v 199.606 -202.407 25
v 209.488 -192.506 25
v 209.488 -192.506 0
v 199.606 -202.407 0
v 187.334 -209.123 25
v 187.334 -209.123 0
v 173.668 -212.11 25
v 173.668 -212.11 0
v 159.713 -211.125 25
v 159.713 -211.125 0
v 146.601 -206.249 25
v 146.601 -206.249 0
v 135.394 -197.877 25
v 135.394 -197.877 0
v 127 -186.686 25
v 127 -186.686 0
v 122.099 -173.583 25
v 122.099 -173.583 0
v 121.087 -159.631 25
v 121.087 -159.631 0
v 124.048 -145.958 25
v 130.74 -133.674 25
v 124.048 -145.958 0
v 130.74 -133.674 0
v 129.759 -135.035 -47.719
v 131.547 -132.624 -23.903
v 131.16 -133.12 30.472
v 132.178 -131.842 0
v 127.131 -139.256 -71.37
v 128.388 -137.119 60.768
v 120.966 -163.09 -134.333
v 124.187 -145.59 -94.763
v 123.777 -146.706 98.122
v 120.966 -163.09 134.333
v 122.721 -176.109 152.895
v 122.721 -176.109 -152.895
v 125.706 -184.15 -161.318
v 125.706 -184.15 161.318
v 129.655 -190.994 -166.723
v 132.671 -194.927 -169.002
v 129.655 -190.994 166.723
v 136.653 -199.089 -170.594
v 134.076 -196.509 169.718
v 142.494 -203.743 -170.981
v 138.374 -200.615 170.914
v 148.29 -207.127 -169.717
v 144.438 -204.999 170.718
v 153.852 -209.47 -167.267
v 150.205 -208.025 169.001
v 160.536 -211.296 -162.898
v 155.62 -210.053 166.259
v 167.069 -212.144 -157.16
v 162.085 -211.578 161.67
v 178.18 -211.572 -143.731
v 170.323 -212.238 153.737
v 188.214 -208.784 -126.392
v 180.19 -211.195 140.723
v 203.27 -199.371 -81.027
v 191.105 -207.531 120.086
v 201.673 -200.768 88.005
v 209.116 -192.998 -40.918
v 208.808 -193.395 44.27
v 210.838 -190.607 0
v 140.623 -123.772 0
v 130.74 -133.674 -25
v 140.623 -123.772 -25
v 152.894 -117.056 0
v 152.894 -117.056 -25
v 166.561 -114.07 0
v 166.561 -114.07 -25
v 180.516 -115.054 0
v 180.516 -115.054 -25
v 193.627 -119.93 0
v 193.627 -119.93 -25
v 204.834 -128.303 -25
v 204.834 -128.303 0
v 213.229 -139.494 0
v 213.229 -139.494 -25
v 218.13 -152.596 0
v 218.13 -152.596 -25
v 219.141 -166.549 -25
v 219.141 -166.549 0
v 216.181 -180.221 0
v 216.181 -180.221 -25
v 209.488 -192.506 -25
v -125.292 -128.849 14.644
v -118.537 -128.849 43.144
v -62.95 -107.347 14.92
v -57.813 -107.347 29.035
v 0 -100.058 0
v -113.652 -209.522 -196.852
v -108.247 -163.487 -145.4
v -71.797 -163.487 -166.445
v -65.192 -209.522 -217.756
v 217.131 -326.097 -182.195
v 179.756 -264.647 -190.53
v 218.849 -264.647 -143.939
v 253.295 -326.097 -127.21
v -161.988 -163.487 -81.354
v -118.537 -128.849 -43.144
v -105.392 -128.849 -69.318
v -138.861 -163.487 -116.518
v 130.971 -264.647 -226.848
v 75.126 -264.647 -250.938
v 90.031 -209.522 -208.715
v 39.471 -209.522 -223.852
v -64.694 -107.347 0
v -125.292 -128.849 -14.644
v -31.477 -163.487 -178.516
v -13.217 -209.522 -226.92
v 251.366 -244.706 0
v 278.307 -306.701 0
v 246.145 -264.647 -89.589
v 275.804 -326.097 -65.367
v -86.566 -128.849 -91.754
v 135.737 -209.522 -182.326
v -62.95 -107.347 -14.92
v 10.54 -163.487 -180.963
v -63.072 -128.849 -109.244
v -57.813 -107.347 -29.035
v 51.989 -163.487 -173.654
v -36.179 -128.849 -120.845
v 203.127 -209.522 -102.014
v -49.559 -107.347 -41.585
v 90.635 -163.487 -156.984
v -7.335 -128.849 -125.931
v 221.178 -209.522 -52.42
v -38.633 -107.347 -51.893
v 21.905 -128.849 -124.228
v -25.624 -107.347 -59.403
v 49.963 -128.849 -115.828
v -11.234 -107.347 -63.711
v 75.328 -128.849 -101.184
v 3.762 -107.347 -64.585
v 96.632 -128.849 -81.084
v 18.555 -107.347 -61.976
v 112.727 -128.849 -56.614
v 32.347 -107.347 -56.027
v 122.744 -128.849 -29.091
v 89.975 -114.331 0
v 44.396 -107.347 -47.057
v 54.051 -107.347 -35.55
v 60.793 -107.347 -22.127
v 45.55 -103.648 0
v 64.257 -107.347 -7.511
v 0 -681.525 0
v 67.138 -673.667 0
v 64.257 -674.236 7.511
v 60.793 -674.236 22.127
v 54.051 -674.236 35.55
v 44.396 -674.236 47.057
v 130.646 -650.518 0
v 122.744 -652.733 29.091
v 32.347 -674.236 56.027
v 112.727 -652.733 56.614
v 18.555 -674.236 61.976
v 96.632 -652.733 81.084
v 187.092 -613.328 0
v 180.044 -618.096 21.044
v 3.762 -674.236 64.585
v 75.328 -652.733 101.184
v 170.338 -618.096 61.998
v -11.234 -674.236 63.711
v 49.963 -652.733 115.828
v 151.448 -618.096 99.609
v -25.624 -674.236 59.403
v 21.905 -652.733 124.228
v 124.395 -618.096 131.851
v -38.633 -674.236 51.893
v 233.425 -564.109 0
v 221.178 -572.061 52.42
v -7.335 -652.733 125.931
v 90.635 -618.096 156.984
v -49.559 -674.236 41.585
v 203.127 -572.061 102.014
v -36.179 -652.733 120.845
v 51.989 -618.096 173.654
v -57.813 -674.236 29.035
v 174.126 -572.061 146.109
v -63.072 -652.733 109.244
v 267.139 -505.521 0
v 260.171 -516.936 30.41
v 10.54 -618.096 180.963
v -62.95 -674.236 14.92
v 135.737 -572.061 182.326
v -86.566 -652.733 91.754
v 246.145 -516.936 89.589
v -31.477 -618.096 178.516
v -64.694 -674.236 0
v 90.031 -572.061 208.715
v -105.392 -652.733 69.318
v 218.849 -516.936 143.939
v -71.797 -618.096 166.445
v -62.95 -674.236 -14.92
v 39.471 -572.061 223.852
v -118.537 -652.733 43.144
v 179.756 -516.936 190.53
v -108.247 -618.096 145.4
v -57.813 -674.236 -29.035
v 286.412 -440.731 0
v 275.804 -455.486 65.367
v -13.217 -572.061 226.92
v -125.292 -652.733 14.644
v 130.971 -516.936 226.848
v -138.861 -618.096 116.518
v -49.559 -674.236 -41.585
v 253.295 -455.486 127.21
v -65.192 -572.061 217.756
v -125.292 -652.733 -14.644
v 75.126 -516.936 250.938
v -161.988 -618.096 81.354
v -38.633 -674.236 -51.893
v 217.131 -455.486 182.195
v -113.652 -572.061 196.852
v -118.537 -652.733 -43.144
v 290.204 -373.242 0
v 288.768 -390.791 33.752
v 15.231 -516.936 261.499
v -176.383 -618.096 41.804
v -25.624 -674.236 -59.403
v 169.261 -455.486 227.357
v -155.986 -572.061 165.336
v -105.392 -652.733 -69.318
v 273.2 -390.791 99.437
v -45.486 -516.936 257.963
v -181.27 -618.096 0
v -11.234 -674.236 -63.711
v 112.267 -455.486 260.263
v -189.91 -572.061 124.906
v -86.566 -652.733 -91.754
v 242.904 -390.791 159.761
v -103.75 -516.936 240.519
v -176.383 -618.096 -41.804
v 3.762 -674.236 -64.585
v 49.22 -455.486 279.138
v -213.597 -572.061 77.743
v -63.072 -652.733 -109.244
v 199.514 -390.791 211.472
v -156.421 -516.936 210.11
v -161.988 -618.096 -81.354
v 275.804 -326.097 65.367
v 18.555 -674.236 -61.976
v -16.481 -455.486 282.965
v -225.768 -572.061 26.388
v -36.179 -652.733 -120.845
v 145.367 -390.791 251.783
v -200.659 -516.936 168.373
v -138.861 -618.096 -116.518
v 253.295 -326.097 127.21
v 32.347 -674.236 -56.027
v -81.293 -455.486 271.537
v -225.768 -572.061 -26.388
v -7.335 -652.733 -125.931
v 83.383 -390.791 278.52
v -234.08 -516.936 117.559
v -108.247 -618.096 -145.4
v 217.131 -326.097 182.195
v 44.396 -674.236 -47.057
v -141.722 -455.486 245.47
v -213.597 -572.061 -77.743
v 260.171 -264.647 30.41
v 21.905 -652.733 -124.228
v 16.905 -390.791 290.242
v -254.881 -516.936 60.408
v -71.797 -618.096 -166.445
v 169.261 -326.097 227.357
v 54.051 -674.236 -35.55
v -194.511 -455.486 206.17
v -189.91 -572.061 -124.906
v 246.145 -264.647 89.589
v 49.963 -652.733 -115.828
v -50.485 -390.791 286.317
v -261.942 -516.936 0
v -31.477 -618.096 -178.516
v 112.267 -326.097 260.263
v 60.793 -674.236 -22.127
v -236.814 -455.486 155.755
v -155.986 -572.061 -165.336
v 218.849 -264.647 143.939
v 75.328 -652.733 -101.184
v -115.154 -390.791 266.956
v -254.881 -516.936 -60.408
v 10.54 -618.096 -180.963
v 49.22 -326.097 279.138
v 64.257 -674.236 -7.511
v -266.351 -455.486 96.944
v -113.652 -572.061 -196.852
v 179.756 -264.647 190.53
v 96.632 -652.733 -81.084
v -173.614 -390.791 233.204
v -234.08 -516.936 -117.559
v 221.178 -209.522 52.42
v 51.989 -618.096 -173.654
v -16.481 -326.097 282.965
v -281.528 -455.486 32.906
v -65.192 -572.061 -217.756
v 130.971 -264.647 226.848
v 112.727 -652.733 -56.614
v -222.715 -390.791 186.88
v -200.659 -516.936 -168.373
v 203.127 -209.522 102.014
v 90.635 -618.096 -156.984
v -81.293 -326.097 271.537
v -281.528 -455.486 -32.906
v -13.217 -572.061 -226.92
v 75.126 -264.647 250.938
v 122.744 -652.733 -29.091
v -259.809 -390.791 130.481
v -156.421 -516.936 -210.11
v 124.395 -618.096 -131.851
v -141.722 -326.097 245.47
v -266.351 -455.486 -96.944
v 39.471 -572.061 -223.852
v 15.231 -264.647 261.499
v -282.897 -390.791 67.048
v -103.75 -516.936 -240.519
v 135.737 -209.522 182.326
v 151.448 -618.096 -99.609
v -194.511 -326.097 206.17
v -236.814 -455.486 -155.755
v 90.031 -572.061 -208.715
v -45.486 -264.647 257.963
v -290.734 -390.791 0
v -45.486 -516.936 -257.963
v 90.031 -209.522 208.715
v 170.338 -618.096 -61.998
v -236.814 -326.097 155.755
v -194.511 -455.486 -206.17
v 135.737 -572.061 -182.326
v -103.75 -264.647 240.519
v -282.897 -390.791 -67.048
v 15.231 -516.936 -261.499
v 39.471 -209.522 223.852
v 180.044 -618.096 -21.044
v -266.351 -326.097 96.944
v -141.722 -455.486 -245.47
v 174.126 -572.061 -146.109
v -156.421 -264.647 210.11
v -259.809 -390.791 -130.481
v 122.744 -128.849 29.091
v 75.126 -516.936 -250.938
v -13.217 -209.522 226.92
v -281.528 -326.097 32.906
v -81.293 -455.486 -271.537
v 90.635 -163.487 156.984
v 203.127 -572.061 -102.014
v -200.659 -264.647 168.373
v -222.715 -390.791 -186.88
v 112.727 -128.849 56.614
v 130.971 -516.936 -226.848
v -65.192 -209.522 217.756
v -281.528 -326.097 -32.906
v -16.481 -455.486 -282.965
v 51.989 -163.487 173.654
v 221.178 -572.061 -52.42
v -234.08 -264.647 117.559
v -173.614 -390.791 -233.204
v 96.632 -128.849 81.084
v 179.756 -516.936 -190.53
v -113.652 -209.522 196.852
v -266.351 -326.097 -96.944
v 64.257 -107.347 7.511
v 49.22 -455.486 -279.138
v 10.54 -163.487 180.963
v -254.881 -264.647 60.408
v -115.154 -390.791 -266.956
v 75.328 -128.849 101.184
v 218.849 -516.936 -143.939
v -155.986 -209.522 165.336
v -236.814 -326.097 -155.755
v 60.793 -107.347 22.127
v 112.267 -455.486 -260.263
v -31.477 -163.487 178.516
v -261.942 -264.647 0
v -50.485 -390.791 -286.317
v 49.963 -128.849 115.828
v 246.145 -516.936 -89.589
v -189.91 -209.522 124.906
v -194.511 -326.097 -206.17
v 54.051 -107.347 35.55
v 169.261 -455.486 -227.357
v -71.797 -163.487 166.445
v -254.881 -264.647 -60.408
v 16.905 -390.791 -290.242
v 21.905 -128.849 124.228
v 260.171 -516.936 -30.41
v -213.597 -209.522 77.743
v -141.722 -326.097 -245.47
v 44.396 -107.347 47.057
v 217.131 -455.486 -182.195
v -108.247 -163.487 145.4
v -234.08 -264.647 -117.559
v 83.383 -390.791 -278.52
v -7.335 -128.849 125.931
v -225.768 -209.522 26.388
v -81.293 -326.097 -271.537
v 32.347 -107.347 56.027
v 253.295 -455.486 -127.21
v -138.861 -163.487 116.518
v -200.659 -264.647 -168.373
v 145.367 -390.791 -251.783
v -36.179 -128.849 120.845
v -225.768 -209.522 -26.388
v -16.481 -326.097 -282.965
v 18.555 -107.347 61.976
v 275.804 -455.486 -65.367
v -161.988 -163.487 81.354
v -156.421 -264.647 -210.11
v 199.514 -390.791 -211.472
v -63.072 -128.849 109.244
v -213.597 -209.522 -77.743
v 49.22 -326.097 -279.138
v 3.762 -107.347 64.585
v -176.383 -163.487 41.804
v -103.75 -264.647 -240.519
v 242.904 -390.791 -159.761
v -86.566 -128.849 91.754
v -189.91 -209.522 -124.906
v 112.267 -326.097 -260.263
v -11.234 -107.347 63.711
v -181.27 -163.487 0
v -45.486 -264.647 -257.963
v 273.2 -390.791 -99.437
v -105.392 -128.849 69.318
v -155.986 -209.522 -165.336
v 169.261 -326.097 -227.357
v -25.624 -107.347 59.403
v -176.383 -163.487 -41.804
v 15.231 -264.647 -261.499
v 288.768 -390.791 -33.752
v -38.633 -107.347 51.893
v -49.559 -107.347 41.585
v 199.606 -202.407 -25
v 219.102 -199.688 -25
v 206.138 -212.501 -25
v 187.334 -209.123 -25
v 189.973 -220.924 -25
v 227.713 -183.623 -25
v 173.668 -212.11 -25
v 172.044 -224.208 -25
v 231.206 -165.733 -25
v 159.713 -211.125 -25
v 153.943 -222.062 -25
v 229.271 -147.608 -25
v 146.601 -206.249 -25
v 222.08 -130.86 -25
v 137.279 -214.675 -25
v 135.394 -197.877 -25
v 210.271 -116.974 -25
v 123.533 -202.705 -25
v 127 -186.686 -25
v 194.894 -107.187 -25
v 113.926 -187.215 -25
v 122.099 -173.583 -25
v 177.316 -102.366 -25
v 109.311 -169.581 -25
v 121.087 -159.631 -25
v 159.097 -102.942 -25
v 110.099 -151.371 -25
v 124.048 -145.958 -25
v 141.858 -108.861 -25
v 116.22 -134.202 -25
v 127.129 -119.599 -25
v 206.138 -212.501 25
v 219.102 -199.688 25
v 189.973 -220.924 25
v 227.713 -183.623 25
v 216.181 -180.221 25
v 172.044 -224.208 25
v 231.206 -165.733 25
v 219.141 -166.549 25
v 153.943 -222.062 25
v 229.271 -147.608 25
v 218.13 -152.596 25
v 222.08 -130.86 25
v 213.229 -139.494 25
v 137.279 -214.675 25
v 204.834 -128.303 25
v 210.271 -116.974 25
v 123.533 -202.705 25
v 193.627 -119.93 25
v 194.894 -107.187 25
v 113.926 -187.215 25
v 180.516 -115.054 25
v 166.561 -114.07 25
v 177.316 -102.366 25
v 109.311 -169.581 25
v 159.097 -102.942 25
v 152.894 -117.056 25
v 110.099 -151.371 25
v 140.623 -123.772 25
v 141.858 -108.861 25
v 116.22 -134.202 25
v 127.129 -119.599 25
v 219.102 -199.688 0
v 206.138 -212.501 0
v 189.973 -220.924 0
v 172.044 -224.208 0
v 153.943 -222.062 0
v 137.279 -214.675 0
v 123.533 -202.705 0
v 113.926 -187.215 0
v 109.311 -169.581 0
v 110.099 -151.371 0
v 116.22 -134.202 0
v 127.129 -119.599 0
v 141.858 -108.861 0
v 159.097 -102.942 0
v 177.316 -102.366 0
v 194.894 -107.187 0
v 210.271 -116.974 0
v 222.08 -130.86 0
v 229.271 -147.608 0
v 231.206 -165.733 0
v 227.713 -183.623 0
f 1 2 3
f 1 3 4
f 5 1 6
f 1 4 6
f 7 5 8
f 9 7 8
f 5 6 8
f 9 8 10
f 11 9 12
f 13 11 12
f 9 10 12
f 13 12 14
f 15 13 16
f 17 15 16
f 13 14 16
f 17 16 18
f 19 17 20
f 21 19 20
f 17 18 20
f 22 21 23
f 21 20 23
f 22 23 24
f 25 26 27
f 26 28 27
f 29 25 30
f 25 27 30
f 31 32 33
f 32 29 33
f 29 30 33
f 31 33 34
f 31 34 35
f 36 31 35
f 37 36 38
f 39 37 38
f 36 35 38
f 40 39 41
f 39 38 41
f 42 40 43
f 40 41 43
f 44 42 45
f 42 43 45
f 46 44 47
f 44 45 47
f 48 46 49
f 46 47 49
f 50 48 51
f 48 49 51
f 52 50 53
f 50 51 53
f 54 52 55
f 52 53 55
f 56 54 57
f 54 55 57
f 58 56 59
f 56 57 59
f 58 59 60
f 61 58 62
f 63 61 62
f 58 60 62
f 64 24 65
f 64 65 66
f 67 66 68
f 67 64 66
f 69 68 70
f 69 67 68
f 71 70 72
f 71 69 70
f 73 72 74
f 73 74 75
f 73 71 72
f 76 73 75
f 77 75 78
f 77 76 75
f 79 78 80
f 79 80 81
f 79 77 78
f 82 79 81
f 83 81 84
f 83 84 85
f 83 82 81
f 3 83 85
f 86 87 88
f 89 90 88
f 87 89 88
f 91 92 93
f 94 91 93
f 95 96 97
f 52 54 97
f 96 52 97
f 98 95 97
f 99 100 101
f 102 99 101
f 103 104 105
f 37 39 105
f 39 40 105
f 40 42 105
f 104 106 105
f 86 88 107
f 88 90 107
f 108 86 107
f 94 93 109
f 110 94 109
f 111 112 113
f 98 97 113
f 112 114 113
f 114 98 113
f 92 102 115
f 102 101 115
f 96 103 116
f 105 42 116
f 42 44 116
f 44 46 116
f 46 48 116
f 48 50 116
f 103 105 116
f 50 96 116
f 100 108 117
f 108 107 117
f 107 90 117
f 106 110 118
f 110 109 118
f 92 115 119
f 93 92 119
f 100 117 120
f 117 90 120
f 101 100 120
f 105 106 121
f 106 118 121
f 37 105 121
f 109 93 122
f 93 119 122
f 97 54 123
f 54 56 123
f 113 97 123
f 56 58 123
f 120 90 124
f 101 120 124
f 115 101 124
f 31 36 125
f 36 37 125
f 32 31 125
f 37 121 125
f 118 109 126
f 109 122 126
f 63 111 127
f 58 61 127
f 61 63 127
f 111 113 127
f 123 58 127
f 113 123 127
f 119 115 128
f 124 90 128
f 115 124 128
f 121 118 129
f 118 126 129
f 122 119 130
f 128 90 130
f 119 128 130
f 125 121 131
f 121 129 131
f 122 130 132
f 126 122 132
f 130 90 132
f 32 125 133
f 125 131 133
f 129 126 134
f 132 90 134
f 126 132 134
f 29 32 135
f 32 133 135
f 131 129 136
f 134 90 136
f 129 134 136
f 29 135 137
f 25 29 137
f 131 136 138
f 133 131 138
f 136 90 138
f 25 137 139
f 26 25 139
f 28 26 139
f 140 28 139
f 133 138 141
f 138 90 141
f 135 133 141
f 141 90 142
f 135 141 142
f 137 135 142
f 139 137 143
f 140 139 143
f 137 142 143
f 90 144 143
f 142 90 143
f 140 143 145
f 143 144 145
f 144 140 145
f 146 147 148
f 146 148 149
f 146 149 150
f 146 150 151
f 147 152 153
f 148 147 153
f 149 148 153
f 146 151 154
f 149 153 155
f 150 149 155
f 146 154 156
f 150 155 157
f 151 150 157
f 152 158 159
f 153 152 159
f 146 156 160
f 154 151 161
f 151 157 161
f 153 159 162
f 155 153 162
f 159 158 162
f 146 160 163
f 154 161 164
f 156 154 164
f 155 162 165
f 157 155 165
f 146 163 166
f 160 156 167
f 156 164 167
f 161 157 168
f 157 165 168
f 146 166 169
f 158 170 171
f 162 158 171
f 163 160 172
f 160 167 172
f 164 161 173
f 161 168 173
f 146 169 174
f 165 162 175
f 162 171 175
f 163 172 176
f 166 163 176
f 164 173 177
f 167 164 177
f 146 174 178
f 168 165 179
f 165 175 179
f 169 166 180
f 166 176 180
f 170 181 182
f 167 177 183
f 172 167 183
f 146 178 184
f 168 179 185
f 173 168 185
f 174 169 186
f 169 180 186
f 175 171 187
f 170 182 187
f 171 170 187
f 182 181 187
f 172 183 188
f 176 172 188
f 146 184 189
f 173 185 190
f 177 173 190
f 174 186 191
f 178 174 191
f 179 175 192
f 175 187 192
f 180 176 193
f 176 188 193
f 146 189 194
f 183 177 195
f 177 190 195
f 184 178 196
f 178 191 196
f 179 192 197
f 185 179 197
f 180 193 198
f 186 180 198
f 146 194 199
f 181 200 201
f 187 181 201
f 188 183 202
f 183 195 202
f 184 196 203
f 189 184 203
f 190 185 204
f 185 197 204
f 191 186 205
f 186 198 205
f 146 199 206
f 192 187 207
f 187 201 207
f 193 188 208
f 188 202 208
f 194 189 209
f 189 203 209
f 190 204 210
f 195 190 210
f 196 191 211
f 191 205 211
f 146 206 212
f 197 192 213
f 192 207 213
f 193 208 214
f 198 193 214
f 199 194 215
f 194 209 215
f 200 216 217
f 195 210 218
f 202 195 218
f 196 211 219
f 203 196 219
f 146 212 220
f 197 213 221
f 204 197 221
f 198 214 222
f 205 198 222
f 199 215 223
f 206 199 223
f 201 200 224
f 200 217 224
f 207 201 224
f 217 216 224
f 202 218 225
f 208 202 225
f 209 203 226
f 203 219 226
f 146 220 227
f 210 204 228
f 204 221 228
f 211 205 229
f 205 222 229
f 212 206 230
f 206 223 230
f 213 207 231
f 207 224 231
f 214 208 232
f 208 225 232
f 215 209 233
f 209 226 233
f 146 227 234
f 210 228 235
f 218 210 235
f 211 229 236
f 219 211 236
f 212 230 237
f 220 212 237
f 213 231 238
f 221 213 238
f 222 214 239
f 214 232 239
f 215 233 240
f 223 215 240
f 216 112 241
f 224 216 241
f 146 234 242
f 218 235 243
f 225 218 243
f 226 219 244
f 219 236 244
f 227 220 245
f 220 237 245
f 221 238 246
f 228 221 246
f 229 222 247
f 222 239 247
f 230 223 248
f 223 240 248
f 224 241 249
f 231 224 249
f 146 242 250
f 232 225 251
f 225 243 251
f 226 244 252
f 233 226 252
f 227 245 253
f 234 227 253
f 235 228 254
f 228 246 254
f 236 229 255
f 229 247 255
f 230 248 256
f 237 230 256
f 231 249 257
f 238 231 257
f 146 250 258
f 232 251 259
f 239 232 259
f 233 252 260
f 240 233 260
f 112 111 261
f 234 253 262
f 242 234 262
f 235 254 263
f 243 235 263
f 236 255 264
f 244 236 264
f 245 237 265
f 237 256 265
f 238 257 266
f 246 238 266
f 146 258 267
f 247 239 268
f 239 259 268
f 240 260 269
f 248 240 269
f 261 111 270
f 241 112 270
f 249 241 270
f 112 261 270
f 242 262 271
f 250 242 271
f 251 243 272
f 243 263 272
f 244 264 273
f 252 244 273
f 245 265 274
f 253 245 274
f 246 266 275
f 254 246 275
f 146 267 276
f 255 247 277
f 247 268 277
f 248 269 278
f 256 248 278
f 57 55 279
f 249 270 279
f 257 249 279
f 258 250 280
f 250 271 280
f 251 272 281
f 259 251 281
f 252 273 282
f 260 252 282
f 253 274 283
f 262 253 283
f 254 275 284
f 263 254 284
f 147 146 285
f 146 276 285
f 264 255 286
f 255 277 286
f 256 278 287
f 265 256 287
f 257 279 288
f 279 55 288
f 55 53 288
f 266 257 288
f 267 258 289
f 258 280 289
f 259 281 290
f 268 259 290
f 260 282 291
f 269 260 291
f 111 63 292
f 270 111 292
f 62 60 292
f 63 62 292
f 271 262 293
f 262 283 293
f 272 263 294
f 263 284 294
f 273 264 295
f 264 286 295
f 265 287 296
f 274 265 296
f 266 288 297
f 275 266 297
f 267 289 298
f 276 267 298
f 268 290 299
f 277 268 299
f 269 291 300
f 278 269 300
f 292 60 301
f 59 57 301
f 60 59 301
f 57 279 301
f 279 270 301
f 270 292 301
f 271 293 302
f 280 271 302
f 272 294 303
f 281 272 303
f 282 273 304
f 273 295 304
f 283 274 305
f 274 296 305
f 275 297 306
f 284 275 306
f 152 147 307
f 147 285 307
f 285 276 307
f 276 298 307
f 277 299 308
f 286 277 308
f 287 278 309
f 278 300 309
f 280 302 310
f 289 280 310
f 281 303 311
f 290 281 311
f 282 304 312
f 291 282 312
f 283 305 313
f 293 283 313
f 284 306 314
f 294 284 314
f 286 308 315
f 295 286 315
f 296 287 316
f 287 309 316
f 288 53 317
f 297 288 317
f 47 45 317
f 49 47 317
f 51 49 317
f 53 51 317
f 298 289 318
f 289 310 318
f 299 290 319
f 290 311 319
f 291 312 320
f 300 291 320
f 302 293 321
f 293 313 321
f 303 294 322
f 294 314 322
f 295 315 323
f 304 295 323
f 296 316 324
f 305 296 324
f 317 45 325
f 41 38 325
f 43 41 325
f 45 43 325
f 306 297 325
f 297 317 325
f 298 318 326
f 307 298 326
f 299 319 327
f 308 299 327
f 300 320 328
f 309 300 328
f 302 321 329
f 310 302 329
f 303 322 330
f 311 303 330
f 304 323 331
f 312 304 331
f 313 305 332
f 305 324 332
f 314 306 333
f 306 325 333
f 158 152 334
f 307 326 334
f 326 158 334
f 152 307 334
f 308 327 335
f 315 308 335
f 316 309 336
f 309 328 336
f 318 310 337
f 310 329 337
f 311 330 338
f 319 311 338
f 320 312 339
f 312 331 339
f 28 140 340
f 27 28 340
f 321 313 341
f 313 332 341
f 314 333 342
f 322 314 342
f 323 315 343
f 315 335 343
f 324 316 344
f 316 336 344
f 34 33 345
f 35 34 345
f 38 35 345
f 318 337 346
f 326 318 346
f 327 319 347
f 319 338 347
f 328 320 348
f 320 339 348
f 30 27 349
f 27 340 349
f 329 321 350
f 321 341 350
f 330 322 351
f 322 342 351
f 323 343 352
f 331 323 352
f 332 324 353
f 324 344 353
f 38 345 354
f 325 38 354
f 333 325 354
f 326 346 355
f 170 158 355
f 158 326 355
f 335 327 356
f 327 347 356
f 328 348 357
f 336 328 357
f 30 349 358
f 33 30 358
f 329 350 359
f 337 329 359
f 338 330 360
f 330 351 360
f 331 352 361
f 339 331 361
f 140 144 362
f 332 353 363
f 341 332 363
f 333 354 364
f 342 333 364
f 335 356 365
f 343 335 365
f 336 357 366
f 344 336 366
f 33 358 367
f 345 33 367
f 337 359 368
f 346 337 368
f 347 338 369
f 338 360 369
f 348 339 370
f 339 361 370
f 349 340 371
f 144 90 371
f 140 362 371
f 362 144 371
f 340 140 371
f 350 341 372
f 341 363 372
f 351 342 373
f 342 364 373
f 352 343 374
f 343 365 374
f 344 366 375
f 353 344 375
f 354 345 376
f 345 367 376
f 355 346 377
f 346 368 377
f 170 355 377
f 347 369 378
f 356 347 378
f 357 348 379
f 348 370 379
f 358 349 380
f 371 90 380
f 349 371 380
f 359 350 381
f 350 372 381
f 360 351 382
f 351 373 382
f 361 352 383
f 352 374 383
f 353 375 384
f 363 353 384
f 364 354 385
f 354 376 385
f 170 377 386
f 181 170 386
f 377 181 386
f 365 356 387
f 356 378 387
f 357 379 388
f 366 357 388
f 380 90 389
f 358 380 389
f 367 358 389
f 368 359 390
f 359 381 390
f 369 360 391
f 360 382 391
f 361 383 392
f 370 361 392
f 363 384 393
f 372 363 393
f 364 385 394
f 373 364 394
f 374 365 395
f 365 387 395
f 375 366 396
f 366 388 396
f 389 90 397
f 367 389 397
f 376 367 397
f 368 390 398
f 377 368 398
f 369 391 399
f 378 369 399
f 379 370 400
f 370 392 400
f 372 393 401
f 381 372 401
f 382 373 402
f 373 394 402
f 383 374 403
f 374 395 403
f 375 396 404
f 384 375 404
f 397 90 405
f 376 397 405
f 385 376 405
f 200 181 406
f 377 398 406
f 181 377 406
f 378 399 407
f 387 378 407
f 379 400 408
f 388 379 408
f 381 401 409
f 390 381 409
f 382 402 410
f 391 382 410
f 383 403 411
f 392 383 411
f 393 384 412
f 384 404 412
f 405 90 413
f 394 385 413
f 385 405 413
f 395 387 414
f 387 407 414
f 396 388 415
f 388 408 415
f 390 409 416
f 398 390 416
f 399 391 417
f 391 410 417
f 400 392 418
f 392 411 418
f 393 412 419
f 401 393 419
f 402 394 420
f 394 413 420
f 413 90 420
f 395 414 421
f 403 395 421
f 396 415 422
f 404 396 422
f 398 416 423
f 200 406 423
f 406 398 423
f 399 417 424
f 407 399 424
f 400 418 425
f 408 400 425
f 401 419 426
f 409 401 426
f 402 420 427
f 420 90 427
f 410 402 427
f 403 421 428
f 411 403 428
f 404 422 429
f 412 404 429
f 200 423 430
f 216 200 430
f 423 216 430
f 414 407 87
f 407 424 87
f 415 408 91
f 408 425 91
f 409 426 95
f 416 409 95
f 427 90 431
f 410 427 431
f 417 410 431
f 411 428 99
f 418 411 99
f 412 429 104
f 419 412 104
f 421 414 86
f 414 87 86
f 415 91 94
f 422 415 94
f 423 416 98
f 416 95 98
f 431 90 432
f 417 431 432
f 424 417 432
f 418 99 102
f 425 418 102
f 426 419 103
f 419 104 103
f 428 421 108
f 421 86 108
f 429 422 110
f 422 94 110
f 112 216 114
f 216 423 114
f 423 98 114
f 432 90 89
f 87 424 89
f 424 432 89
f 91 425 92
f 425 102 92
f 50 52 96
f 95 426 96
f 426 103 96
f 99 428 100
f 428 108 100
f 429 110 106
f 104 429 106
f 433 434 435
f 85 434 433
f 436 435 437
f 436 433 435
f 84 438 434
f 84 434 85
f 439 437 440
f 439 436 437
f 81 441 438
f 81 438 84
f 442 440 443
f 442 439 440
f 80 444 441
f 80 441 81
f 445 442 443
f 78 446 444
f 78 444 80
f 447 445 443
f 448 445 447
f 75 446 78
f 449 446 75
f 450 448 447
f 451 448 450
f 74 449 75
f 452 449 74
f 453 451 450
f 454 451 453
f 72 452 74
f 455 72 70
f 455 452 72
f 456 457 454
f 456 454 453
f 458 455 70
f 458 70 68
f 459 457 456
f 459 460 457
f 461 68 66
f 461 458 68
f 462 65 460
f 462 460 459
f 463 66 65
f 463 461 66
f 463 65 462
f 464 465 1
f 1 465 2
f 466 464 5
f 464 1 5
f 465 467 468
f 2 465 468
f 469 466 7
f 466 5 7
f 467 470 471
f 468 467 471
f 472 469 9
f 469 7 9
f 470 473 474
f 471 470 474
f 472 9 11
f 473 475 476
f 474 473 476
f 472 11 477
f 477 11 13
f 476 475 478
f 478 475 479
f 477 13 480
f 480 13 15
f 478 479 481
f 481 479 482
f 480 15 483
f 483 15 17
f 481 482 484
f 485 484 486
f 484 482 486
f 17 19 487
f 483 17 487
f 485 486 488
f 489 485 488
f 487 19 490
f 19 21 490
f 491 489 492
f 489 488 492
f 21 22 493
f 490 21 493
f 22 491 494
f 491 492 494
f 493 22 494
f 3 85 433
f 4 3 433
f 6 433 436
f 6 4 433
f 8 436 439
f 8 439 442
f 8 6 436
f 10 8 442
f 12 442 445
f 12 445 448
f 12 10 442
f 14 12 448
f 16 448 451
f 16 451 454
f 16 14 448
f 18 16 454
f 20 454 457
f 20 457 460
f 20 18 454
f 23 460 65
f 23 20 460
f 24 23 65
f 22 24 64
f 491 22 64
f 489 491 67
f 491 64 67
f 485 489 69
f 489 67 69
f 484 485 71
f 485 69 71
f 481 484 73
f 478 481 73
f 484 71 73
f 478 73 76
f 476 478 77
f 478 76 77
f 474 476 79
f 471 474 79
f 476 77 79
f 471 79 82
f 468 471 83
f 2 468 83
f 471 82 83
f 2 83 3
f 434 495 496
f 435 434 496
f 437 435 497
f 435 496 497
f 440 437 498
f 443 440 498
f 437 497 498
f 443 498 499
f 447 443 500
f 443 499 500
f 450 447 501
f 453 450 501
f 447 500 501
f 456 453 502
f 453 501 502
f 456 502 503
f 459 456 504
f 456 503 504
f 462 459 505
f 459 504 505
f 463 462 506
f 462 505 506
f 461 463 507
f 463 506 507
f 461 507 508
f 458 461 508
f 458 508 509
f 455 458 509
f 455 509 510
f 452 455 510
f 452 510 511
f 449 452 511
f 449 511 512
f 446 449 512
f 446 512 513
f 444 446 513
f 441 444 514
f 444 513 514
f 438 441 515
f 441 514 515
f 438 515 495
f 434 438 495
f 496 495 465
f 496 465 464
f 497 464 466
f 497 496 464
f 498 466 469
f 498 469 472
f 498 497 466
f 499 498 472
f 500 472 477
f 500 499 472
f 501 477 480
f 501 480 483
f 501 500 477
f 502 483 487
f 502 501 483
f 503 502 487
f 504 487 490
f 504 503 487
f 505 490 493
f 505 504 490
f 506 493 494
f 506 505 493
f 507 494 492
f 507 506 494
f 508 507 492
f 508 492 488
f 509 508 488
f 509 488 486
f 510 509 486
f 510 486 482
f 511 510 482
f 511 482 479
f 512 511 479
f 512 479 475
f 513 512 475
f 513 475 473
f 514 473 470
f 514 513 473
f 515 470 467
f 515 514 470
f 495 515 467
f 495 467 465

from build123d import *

# Parameters (mm, degrees)
AUFSATZ_LINEAR_AUSTRAGEN1_DEPTH = 25
SKIZZE5_R                       = 49.148822587
SCHNITT_LINEAR_AUSTRAGEN3_DEPTH = 200


with BuildPart() as part:
    # Skizze1 → Rotation1 (revolve)
    with BuildSketch(Plane.XY):
        with BuildLine():
            Line((0, -100.057658787), (0, -681.525107773))
            ThreePointArc((0, -681.525107773), (290.733724493, -390.79138328), (0, -100.057658787))
        make_face()
    revolve(axis=Axis((0, -100.057658787, 0), (0, -1, 0)))

    # Skizze5 → Schnitt-Linear austragen3 (cut, symmetric)
    with BuildSketch(Plane.XY):
        with Locations(Location((170.114345328, -163.08975929, 0), (0, 0, 180))):  # turned: the seam where the file's is
            Circle(SKIZZE5_R)
    extrude(amount=SCHNITT_LINEAR_AUSTRAGEN3_DEPTH, both=True, mode=Mode.SUBTRACT)


with BuildPart() as body_2:
    # Skizze2 → Aufsatz-Linear austragen1 (new body, symmetric)
    with BuildSketch(Plane.XY):
        with BuildLine():
            ThreePointArc((121.127022973, -126.491661631), (206.712442986, -114.102436935), (219.101667683, -199.687856948))
            ThreePointArc((219.101667683, -199.687856948), (133.516247669, -212.077081645), (121.127022973, -126.491661631))
        make_face()
        with BuildLine():
            ThreePointArc((130.74041933, -133.673765118), (199.5303395, -123.715833291), (209.488271326, -192.505753462))
            ThreePointArc((209.488271326, -192.505753462), (140.698351156, -202.463685288), (130.74041933, -133.673765118))
        make_face(mode=Mode.SUBTRACT)
    extrude(amount=AUFSATZ_LINEAR_AUSTRAGEN1_DEPTH, both=True)


solid = Compound([part.part, body_2.part])
